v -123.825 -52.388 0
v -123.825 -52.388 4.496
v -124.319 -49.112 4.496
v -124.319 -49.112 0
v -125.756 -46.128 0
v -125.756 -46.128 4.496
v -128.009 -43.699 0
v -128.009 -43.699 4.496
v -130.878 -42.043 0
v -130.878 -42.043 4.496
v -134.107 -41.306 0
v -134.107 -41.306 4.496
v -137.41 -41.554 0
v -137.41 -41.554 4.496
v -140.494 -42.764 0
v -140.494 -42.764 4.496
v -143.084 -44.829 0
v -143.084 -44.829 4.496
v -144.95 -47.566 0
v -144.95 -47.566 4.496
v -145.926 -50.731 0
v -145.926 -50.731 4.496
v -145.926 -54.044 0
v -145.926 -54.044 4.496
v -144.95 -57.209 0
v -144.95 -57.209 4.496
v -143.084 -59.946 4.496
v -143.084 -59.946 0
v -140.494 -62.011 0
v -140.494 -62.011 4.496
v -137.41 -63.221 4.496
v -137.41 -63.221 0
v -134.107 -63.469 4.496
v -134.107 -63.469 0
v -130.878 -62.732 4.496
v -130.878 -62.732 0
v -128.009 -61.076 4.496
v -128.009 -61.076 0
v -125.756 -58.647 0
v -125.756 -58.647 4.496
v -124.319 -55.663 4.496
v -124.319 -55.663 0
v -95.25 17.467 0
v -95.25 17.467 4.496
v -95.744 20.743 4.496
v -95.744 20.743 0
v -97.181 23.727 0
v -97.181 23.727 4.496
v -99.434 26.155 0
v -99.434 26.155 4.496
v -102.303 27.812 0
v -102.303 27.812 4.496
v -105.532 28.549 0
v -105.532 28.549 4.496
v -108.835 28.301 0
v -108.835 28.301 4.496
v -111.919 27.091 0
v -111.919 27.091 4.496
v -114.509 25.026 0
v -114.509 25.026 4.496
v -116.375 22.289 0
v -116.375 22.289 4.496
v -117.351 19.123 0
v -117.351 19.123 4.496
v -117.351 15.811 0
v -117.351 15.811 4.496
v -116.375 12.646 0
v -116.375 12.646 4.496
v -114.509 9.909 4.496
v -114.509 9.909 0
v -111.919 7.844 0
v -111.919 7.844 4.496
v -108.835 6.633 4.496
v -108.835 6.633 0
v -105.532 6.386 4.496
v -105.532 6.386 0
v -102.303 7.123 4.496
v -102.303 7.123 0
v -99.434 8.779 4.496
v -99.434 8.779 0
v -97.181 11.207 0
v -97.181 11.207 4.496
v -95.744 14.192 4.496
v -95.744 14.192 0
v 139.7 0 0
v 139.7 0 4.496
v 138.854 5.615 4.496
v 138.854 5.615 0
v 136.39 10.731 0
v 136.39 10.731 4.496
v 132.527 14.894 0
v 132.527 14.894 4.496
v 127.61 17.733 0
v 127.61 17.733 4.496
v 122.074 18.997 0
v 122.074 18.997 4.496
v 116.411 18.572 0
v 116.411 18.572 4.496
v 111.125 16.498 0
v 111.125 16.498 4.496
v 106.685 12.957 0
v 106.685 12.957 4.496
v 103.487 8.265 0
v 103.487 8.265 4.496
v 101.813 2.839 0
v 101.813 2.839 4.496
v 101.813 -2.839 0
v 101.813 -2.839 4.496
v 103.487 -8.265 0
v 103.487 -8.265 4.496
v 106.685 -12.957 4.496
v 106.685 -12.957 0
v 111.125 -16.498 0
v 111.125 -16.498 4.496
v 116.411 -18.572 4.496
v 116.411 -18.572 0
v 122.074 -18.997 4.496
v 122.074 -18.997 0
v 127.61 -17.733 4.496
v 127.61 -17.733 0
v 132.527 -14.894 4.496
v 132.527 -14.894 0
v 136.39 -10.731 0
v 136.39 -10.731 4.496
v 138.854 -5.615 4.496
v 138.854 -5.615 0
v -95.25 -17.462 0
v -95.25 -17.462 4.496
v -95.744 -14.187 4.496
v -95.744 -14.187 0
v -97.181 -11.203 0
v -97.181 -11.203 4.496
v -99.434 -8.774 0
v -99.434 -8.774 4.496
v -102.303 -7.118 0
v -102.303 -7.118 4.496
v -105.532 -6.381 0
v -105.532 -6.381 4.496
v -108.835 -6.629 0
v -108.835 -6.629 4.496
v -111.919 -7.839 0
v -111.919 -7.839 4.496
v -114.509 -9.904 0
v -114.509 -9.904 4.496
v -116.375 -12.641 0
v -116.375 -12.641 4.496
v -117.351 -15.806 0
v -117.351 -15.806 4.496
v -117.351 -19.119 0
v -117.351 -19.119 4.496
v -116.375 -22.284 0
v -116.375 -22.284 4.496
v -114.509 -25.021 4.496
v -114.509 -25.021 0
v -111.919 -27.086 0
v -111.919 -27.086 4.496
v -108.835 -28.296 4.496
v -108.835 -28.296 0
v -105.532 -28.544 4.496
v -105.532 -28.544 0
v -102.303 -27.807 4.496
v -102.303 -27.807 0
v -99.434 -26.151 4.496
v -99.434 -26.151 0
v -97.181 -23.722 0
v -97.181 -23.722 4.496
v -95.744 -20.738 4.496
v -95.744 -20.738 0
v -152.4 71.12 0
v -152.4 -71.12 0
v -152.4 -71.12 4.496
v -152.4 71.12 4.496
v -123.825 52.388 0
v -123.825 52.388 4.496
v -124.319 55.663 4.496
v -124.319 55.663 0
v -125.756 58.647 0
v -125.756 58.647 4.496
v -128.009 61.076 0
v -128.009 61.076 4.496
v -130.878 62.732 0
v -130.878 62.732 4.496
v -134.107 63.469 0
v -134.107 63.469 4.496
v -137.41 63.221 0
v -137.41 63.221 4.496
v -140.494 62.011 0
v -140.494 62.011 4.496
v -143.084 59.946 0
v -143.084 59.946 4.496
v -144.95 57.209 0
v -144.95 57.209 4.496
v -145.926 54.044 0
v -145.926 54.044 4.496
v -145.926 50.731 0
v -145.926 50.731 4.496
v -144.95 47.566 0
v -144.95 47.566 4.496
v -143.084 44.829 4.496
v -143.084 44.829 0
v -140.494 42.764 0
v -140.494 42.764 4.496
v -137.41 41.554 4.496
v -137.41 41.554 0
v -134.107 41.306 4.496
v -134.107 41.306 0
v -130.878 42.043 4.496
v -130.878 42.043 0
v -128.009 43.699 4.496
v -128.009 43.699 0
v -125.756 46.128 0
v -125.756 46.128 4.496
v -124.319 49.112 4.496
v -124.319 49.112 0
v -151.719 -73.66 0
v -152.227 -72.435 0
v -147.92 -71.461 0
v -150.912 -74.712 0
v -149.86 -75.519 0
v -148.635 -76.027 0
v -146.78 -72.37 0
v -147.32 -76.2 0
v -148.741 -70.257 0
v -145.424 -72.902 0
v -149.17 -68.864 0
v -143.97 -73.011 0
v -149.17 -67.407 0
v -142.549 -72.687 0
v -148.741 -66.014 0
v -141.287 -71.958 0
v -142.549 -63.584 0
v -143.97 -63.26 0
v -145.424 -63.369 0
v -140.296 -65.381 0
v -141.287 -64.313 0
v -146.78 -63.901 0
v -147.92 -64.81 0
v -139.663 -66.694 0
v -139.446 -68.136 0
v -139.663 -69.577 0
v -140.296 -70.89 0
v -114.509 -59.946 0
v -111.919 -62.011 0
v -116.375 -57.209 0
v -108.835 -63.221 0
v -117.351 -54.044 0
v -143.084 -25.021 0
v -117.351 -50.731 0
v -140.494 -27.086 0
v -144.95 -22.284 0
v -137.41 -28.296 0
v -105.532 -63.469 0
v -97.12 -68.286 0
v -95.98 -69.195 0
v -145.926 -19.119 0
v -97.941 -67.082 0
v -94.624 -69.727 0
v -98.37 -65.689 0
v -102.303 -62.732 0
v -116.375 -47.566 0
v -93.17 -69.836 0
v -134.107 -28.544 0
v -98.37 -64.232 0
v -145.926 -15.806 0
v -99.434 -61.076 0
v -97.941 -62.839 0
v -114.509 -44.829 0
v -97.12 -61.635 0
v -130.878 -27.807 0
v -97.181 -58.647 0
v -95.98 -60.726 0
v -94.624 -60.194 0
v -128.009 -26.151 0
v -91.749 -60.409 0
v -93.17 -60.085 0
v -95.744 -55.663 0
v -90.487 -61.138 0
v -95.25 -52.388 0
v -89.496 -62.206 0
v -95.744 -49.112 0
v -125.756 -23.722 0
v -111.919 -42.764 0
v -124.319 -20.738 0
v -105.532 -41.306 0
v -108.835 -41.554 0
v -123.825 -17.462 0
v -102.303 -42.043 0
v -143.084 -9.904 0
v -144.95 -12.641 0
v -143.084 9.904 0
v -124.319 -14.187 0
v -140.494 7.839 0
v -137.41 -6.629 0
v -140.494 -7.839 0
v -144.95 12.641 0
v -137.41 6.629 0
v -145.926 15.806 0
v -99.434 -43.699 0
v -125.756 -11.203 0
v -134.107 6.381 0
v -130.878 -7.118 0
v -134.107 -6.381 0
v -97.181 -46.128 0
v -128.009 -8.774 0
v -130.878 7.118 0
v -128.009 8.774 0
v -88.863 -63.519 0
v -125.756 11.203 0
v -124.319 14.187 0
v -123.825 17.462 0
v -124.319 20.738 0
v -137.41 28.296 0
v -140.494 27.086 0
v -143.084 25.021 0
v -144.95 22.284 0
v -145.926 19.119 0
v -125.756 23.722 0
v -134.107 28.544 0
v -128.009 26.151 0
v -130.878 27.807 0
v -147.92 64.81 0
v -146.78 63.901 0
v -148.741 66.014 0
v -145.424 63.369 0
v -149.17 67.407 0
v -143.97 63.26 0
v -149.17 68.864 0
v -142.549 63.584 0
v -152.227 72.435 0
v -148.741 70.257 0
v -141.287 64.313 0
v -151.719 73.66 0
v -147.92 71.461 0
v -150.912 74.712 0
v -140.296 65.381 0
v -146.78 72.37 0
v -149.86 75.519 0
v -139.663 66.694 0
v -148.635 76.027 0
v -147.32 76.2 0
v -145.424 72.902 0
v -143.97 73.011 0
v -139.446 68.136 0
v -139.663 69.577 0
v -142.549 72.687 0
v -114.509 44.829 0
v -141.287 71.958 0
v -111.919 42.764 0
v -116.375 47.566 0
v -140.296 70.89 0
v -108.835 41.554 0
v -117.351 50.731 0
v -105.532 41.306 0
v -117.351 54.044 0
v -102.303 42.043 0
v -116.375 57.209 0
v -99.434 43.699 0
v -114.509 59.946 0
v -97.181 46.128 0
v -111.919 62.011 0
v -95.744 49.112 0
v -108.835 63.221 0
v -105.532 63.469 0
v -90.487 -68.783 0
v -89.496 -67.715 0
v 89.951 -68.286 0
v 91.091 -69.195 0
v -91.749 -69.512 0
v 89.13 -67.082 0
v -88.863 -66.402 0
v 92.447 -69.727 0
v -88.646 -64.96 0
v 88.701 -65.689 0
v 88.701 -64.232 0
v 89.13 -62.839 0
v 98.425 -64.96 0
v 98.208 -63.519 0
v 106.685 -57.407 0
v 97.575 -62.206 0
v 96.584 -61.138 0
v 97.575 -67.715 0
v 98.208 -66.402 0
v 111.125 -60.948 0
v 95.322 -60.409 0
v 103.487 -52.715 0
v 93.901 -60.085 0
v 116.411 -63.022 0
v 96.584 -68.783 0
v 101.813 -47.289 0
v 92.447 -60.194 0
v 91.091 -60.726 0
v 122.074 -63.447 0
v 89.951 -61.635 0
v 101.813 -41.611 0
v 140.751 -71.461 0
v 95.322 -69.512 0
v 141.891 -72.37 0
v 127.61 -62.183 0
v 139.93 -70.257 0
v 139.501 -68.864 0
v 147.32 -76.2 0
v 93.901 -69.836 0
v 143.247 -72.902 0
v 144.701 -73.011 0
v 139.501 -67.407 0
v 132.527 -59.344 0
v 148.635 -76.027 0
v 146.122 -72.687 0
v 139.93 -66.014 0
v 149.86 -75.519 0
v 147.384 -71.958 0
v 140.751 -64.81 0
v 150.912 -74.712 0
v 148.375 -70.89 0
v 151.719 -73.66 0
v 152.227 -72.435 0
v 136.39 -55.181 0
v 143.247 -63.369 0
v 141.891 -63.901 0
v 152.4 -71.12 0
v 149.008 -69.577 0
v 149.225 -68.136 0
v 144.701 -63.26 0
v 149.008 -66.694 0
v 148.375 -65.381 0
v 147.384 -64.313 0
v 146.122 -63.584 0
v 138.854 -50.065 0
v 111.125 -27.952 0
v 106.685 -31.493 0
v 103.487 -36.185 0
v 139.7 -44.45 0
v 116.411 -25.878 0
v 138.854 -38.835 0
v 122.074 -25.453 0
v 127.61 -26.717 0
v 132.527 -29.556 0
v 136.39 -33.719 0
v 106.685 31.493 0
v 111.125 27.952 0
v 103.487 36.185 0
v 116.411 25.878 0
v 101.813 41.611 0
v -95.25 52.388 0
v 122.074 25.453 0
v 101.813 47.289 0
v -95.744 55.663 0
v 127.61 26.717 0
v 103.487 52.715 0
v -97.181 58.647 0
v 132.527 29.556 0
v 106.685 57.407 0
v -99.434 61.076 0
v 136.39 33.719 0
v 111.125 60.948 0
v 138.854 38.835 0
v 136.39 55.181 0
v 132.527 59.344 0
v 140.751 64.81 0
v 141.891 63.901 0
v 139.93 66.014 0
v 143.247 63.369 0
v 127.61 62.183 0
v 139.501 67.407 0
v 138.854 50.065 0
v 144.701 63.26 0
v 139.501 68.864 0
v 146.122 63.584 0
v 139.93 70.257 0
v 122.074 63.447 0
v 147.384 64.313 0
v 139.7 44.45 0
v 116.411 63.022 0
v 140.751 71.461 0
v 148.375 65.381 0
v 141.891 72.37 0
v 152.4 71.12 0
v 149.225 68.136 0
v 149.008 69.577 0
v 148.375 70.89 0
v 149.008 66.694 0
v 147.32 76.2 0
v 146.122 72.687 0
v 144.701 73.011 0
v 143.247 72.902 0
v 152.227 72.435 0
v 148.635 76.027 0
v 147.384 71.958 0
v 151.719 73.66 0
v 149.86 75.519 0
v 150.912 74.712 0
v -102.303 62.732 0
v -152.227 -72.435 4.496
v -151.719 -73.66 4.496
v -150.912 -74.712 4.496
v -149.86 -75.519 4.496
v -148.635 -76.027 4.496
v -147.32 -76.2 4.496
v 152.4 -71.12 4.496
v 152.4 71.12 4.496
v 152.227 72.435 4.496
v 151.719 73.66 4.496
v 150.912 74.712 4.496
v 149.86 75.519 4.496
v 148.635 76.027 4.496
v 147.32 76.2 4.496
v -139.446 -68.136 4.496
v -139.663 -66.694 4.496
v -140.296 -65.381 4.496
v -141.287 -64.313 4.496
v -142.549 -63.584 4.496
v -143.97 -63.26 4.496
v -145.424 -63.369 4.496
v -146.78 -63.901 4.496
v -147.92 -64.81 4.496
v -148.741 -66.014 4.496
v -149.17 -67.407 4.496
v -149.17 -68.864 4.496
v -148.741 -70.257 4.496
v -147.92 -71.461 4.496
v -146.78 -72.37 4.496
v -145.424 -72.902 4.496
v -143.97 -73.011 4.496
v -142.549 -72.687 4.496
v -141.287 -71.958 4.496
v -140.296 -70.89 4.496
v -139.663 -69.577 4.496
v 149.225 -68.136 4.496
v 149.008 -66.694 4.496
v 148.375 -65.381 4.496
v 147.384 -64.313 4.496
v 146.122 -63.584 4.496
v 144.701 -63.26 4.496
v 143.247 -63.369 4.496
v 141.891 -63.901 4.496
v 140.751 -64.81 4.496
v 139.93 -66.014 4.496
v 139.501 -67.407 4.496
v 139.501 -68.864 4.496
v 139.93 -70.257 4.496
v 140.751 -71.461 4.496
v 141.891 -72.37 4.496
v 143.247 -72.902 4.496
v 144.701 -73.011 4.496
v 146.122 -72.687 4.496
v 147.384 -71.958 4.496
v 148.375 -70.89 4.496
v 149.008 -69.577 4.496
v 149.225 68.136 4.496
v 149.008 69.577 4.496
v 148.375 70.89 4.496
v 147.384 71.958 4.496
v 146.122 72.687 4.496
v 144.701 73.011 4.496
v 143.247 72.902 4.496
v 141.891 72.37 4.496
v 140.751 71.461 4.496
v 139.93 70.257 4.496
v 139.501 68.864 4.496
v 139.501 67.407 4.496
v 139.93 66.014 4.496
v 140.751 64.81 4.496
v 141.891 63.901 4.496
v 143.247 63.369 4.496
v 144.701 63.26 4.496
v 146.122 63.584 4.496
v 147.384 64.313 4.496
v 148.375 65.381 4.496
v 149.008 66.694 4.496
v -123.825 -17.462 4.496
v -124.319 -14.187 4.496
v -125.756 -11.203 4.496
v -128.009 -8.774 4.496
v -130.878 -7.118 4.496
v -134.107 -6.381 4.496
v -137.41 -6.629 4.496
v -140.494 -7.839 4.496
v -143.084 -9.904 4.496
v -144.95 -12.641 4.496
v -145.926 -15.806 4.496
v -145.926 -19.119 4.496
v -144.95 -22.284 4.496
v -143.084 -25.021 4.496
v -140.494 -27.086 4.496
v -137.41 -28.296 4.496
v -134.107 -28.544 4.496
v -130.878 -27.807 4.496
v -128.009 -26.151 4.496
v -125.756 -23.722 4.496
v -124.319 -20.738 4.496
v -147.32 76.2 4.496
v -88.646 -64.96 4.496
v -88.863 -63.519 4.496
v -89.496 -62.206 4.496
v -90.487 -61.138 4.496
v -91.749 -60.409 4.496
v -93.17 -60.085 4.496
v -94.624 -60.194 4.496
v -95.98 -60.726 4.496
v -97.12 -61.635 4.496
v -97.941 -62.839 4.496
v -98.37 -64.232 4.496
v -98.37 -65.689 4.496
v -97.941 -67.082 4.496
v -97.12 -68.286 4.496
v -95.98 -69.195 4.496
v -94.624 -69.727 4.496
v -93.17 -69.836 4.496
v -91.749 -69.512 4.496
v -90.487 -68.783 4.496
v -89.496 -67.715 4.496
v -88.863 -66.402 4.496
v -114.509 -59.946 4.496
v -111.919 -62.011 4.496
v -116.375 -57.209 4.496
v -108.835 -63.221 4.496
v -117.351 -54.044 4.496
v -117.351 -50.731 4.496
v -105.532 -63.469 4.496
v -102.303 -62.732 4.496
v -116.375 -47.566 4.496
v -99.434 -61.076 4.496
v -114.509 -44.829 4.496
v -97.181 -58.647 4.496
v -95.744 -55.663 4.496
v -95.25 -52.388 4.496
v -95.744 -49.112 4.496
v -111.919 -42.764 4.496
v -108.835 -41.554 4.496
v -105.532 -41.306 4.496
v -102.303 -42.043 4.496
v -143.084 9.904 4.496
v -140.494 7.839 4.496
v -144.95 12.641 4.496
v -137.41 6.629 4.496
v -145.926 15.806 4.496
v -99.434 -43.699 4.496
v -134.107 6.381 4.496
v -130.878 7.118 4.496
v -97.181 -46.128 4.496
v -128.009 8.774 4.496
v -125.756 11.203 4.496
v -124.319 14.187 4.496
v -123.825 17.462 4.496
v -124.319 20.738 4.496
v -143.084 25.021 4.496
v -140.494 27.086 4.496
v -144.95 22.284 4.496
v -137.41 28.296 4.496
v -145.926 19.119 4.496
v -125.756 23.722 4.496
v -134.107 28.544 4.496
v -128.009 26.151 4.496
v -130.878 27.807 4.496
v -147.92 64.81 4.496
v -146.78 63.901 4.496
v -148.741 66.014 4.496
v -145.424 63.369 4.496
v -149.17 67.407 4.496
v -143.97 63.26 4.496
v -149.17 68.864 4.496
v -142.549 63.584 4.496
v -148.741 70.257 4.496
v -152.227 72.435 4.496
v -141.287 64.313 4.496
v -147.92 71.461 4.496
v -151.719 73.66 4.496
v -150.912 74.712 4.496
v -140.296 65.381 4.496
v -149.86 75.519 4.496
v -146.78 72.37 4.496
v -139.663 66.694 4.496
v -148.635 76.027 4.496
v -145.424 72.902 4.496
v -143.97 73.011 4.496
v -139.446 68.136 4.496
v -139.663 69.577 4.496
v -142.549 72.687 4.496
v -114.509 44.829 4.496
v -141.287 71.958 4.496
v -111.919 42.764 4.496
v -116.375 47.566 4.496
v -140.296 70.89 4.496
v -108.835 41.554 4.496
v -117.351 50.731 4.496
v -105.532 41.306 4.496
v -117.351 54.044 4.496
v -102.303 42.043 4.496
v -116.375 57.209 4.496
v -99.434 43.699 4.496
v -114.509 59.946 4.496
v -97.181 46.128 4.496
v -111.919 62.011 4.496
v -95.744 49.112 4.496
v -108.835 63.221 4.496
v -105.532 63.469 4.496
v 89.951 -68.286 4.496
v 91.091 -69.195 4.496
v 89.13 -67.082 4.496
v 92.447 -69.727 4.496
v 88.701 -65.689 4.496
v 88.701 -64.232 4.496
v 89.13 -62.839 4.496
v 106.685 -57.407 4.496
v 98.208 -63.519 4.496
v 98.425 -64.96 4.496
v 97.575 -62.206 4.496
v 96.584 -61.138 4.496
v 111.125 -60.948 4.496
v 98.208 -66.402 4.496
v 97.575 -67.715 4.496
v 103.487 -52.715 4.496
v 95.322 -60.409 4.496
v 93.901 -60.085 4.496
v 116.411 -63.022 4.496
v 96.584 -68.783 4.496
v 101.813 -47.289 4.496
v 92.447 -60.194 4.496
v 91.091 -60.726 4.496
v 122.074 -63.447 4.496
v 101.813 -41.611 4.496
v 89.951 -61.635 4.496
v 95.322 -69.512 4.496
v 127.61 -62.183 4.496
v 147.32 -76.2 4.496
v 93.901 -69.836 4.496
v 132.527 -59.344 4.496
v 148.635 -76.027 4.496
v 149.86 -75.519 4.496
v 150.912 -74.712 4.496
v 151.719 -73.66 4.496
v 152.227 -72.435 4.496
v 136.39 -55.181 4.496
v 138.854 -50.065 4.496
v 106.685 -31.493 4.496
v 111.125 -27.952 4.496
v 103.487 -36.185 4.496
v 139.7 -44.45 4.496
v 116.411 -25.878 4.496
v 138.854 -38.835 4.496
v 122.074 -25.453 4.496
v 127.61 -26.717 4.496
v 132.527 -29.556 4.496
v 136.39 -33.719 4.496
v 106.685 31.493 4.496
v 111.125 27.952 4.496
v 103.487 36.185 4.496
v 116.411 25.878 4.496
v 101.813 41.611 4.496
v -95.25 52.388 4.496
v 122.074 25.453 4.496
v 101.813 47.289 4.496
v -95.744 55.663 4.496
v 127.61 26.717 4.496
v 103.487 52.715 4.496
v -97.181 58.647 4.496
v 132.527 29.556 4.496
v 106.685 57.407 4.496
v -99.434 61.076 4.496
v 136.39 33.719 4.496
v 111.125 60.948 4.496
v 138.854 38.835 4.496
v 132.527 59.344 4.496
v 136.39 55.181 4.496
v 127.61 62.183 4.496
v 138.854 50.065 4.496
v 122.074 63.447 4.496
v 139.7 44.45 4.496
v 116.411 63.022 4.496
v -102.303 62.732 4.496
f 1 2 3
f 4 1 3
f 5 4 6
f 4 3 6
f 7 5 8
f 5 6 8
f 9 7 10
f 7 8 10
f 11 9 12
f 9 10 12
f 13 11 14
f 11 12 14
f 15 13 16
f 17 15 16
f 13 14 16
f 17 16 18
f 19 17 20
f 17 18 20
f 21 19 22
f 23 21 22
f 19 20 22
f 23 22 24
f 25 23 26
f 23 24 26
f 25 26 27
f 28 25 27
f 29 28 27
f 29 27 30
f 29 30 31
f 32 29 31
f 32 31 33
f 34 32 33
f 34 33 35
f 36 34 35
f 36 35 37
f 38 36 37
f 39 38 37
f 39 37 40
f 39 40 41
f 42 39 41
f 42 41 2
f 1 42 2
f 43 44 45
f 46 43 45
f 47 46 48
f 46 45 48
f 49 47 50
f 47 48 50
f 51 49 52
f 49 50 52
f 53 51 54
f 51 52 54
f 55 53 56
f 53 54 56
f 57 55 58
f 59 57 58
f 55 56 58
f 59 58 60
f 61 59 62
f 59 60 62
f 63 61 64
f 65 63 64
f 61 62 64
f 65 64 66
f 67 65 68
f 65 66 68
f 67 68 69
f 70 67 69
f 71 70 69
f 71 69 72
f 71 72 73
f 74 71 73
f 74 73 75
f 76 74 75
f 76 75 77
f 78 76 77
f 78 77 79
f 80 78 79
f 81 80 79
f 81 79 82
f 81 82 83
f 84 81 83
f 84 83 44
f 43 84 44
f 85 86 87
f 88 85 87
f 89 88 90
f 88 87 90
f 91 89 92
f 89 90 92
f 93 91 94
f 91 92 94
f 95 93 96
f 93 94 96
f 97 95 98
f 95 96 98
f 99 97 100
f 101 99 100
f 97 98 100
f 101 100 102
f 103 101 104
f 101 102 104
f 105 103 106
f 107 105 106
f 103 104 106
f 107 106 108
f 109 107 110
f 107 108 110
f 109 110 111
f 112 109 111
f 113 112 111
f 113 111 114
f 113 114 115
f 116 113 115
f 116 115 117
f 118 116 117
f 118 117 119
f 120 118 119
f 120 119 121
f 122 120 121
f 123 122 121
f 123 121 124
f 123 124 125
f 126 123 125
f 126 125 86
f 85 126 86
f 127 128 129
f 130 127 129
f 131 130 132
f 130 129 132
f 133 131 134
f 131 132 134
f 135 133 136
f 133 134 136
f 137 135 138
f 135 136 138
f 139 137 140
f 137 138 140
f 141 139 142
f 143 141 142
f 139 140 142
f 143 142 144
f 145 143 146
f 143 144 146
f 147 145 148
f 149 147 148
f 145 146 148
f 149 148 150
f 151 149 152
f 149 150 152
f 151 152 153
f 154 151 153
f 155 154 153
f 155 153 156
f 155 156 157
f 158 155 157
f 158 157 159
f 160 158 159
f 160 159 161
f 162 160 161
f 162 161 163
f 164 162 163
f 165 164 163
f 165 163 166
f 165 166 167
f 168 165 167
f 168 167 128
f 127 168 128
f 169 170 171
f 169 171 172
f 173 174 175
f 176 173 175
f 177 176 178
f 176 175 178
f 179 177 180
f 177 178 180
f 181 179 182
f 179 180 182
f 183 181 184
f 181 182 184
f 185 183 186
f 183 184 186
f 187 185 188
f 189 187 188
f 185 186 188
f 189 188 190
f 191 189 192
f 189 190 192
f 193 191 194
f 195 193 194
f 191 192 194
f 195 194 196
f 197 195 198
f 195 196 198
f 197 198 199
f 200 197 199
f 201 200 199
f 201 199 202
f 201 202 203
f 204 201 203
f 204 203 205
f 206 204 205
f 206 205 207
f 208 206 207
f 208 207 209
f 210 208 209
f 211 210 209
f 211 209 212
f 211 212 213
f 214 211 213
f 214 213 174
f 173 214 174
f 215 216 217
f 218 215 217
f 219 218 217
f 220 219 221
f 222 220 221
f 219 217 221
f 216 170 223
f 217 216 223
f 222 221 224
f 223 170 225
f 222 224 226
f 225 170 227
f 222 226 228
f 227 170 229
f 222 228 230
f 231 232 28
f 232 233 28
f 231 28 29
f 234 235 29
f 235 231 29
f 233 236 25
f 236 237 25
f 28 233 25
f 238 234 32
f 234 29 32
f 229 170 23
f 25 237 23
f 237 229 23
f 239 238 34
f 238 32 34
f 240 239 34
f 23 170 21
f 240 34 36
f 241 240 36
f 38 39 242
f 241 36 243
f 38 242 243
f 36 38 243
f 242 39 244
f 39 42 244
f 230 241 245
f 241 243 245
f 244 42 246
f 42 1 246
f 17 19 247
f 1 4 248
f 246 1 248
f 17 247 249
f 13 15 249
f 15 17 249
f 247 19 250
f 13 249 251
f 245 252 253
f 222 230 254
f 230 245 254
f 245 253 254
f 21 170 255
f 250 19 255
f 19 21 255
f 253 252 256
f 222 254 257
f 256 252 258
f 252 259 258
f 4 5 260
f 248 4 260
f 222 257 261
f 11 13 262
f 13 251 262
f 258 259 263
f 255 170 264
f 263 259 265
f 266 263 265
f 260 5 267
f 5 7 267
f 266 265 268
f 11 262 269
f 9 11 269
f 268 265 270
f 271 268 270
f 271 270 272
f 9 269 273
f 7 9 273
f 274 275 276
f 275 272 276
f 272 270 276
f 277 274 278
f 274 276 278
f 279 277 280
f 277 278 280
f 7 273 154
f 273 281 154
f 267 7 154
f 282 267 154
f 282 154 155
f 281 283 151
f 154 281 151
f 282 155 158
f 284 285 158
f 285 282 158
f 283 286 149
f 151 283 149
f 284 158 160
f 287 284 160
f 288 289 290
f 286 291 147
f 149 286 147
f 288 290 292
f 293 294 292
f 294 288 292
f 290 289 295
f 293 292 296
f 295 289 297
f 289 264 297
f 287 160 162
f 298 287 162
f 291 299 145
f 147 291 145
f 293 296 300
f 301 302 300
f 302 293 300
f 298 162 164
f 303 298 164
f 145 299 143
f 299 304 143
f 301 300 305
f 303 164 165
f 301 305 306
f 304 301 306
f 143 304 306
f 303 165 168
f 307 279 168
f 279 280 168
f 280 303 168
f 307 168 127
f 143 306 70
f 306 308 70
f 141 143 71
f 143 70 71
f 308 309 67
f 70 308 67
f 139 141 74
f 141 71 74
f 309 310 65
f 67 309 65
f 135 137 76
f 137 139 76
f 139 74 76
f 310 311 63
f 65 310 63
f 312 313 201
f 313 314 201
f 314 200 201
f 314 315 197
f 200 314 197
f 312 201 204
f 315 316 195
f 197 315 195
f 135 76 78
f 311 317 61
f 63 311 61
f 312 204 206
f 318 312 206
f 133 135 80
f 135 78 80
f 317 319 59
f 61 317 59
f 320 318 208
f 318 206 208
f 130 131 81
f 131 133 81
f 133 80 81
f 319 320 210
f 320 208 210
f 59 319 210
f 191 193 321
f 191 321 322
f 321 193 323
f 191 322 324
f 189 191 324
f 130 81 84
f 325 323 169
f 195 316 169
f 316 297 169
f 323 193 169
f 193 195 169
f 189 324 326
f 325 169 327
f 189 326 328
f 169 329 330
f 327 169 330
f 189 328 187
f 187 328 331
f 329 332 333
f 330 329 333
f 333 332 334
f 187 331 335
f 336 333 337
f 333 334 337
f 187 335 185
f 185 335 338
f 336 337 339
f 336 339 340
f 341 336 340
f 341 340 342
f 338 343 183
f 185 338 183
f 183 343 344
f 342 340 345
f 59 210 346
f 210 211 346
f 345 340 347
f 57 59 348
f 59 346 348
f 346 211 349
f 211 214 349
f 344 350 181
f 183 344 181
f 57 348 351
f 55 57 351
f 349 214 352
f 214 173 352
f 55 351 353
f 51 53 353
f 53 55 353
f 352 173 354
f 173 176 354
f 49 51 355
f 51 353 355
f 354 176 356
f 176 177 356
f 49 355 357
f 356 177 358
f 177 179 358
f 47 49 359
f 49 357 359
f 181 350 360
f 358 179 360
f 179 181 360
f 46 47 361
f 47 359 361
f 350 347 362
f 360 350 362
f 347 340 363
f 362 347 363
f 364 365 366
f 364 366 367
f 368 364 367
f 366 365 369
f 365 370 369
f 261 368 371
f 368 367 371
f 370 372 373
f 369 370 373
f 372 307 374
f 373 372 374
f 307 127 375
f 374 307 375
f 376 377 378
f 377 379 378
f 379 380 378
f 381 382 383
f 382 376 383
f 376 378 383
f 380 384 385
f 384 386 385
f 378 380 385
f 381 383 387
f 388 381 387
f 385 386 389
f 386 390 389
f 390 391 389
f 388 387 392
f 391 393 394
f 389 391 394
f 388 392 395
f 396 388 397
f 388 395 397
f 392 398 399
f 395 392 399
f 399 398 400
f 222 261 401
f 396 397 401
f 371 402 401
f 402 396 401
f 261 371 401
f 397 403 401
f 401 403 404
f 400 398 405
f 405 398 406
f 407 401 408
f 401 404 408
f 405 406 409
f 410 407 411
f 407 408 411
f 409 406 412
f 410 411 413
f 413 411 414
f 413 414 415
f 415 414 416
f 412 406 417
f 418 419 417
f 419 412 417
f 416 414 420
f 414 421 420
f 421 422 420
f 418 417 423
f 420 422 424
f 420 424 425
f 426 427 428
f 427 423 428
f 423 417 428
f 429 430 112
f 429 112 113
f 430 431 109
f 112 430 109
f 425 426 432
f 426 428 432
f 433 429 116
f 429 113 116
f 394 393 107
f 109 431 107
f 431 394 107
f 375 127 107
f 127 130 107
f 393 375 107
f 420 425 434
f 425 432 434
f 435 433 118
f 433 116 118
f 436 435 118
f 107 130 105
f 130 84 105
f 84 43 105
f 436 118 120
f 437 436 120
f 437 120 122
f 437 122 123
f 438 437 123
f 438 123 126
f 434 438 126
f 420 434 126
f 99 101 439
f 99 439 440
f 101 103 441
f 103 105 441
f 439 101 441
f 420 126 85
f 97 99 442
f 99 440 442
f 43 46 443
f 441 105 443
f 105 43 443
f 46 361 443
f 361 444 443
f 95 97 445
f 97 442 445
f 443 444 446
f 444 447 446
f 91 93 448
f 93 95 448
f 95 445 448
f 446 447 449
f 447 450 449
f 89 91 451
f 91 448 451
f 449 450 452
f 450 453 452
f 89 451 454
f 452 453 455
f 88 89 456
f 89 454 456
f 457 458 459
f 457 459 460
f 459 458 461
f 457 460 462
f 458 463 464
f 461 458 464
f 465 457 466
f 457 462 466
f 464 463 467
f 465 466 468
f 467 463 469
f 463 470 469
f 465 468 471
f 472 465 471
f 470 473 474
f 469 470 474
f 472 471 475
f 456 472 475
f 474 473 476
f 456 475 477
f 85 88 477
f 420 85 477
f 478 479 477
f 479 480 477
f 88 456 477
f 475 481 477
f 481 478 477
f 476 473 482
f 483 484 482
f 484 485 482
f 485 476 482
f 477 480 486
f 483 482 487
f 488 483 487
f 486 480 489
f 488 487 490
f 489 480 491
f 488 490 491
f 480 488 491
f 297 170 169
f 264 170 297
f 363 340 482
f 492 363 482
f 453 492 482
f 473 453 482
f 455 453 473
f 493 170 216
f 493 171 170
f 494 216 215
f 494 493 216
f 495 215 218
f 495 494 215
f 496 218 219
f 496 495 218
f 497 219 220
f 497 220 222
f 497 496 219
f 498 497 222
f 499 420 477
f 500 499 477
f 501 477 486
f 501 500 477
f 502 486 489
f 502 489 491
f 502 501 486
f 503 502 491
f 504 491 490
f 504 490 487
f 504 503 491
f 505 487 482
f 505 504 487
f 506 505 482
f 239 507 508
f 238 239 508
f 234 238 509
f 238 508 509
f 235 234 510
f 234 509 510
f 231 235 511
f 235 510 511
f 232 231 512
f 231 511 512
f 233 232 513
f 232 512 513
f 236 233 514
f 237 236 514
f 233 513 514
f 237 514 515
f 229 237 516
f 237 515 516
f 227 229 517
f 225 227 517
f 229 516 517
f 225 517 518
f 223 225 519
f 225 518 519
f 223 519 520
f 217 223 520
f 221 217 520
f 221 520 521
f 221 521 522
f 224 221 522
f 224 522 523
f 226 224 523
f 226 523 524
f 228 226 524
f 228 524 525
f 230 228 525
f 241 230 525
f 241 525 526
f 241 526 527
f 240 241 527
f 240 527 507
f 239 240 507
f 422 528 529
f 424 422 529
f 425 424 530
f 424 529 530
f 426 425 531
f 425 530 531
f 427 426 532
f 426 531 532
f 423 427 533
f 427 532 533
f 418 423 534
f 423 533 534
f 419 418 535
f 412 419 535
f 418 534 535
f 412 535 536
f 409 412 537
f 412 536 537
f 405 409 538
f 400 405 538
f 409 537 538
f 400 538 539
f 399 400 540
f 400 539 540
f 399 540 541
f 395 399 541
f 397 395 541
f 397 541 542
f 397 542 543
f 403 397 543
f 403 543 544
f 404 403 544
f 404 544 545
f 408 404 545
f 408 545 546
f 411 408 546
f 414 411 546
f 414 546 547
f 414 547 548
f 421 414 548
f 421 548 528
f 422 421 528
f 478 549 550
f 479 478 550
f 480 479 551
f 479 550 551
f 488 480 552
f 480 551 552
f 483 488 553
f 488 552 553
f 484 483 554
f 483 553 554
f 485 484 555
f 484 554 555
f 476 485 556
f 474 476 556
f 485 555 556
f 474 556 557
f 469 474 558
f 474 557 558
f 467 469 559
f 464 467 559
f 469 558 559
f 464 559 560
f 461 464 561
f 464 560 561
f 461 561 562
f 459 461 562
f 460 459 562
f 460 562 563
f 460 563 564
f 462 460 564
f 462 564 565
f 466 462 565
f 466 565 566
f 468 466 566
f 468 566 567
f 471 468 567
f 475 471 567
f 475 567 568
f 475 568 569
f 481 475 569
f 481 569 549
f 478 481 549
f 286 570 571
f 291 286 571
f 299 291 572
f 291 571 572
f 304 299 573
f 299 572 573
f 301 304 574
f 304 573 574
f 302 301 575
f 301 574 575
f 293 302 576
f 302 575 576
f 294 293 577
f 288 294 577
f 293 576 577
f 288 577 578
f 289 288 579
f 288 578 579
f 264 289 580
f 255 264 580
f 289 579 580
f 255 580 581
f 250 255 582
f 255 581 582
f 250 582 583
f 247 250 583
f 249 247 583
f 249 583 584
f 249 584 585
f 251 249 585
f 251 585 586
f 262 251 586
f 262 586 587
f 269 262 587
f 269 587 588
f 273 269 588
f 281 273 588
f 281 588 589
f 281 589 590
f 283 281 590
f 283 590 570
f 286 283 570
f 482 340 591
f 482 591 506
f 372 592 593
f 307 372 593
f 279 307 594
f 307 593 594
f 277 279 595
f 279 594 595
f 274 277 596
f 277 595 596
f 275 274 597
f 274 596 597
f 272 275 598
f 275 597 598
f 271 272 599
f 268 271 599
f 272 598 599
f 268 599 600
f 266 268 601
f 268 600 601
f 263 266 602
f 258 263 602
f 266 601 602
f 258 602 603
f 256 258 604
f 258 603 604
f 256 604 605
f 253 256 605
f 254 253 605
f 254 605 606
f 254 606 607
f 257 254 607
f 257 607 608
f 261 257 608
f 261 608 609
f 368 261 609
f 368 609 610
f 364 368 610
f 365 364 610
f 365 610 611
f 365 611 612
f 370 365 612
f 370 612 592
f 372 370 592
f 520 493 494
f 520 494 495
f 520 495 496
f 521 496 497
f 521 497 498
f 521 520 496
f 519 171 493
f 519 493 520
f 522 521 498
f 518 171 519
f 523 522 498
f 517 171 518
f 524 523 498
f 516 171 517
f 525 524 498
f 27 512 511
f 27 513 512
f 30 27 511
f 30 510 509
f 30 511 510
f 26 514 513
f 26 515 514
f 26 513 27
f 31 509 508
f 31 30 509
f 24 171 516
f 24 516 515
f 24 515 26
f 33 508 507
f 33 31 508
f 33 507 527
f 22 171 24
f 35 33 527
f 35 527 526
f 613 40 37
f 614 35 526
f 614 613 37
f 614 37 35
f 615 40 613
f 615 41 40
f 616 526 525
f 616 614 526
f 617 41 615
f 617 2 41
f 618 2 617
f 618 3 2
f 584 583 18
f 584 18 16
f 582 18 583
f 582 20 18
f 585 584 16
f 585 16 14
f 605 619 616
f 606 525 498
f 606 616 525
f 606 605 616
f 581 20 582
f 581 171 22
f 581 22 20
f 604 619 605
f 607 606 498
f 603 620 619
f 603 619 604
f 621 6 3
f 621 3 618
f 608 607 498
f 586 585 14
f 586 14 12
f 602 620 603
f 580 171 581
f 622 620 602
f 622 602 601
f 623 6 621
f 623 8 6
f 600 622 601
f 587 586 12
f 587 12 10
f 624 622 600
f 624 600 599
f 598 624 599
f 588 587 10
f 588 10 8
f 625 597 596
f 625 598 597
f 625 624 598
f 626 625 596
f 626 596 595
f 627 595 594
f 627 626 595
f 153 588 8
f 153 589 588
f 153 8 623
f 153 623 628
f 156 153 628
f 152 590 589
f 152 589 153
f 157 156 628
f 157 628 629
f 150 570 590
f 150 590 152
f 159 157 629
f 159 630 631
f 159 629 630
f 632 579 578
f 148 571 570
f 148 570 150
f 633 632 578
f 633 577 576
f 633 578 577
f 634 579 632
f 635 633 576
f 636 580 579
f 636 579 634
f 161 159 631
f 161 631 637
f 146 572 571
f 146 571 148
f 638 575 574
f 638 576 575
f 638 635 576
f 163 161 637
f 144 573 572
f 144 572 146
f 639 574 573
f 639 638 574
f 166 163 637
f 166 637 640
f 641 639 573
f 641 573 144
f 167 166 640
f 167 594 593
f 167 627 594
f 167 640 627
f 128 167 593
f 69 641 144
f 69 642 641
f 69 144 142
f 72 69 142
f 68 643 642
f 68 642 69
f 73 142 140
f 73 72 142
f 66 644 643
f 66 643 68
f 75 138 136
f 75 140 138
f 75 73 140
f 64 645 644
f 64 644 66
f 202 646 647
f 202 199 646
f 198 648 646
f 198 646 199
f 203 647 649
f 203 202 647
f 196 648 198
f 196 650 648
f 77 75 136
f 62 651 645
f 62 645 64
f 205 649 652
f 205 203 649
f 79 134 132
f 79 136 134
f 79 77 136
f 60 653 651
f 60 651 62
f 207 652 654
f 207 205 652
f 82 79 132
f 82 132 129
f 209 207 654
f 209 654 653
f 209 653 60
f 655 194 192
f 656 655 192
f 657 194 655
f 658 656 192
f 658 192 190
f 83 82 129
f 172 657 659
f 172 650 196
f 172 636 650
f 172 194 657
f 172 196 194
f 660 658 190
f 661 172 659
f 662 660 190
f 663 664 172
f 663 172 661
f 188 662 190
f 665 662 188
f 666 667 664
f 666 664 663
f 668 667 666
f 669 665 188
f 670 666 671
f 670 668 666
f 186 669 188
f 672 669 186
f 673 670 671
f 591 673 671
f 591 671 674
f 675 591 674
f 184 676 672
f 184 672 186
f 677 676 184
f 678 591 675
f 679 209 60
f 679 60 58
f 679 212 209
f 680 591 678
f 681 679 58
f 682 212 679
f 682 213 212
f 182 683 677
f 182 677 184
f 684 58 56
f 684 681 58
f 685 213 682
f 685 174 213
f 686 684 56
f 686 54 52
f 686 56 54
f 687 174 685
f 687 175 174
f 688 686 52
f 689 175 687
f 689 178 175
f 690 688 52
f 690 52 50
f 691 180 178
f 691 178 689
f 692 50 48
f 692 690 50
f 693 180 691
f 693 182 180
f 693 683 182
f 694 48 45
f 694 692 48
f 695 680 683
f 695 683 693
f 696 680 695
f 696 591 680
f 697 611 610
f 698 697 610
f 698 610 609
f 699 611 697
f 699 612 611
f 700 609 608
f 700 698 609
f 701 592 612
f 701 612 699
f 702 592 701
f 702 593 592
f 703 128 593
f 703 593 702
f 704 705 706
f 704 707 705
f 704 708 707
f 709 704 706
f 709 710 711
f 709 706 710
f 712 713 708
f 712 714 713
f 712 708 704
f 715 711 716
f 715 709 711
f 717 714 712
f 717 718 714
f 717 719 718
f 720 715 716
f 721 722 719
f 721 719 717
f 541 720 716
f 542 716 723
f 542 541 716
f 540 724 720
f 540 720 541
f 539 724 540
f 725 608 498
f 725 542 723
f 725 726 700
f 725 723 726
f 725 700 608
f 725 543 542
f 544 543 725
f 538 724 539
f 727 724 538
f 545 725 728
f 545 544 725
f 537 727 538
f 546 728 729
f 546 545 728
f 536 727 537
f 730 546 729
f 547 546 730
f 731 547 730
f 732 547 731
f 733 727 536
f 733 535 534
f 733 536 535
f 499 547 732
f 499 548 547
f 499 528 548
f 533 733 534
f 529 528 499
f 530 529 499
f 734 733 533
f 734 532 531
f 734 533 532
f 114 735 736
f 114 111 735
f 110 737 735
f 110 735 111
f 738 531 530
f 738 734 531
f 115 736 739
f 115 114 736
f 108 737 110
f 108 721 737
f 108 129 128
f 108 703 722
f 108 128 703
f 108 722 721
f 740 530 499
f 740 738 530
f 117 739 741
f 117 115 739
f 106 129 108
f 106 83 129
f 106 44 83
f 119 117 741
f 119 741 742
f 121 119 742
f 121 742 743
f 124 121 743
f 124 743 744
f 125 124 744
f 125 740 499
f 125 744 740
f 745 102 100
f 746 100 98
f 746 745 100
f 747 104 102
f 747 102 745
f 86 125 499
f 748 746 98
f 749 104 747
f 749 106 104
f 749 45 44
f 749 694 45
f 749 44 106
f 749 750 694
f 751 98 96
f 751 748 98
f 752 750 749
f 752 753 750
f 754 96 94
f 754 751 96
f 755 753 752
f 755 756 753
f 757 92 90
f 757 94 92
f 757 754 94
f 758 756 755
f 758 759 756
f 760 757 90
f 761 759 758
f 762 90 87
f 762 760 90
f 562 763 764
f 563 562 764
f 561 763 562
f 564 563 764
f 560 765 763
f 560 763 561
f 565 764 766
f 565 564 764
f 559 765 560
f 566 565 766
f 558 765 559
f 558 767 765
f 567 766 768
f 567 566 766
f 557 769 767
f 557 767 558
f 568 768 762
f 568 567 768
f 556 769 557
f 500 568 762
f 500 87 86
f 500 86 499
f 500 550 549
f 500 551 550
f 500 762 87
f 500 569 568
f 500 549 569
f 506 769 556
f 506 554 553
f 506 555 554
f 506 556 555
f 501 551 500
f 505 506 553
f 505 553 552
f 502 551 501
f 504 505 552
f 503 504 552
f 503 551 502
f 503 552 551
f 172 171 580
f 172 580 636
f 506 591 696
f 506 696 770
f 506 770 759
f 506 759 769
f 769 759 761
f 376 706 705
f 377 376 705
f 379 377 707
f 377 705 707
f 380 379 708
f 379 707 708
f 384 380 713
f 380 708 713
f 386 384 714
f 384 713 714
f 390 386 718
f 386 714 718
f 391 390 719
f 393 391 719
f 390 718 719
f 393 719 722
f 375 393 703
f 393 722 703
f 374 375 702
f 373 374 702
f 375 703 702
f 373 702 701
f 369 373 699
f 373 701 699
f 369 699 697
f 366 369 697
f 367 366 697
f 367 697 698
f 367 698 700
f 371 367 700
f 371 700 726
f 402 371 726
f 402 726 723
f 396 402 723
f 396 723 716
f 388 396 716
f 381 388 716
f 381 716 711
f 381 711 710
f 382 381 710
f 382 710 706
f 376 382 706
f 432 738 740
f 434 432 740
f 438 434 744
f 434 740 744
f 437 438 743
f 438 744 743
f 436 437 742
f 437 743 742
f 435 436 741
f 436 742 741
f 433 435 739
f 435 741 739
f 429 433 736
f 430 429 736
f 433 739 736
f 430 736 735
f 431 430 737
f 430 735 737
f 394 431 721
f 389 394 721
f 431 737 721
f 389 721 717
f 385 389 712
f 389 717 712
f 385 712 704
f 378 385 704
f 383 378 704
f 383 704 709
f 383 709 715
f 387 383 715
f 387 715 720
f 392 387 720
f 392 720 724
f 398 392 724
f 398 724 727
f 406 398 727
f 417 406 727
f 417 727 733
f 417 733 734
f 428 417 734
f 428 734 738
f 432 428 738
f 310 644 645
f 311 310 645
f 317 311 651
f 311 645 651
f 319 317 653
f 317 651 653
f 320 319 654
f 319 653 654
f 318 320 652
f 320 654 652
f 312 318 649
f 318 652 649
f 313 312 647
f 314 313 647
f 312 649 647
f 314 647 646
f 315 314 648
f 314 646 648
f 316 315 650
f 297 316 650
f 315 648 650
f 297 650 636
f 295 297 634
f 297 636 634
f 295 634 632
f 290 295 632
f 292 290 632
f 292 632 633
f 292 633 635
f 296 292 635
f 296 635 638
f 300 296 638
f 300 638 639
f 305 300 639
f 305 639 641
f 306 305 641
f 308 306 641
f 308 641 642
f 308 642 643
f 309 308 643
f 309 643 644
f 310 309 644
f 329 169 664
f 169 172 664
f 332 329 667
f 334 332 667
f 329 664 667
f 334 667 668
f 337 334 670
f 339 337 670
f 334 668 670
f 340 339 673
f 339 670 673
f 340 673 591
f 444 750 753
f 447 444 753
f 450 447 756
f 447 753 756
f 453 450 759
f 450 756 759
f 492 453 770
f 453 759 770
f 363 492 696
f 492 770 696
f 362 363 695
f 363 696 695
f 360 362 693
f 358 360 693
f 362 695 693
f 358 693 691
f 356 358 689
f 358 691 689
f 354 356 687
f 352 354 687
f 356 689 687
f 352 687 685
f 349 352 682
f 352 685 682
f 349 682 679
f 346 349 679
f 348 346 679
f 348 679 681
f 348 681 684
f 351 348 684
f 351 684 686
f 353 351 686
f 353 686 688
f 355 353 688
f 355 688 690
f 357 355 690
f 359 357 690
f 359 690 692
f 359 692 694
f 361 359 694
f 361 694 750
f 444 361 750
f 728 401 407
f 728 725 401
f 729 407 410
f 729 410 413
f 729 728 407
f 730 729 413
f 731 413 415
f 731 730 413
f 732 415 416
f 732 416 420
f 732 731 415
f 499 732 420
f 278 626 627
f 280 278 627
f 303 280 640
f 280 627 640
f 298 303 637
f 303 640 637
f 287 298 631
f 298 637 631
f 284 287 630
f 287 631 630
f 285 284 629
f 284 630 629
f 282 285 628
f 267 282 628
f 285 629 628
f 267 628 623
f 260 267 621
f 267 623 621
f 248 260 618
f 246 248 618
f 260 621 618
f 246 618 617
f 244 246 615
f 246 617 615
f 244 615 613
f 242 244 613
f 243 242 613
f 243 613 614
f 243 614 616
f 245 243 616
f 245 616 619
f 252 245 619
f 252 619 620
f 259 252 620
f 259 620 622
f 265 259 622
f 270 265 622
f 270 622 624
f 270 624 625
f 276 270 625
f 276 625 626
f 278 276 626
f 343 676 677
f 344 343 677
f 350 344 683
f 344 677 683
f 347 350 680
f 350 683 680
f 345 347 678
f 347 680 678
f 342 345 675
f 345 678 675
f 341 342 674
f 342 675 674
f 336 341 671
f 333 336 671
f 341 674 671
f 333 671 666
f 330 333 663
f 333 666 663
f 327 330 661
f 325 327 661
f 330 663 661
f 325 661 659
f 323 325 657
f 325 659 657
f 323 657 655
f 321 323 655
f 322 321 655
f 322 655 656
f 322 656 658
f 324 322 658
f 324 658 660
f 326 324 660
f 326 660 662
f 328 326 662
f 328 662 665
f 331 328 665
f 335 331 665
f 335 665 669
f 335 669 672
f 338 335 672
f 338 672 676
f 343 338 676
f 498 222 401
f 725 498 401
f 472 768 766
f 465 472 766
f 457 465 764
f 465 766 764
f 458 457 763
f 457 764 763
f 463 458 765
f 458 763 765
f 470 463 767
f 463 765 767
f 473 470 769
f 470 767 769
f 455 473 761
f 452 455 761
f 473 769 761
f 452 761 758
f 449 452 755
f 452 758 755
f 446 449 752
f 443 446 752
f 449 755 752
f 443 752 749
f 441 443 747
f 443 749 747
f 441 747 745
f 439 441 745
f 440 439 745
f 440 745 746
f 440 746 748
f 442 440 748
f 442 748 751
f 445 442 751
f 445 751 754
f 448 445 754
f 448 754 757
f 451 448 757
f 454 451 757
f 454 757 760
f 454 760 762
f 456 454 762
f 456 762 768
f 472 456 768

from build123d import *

# Parameters (mm, degrees)
F0_W      = 304.8
F0_H      = 152.4
F1_DEPTH  = 4.4958
F2_R      = 5.08
F3_R      = 4.8895
F4_DEPTH  = 4.4968
F5_R      = 11.1125
F6_DEPTH  = 4.4968
F7_R      = 19.05
F8_DEPTH  = 4.4968
F9_R      = 4.8895
F10_DEPTH = 4.4968


with BuildPart() as f1:
    # F0 (on Top) → F1 (new body)
    with BuildSketch(Plane.XY):
        Rectangle(F0_W, F0_H)
    extrude(amount=F1_DEPTH)

    # F2
    f2_edges = [f1.edges().sort_by_distance(p)[0] for p in [
        (-152.4, 76.2, 2.2479),
        (-152.4, -76.2, 2.2479),
        (152.4, -76.2, 2.2479),
        (152.4, 76.2, 2.2479),
    ]]
    fillet(f2_edges, radius=F2_R)

    # F3 (on face) → F4 (cut, through all)
    with BuildSketch(Plane.XY.offset(4.4958)):
        with Locations((-144.3355, 68.1355)):
            Circle(F3_R)
        with Locations((-144.3355, -68.1355)):
            Circle(F3_R)
        with Locations((144.3355, -68.1355)):
            Circle(F3_R)
        with Locations((144.3355, 68.1355)):
            Circle(F3_R)
    extrude(amount=-F4_DEPTH, mode=Mode.SUBTRACT)

    # F5 (on face) → F6 (cut, through all)
    with BuildSketch(Plane.XY.offset(4.4958)):
        with Locations((-106.3625, 52.3875)):
            Circle(F5_R)
        with Locations((-134.9375, 52.3875)):
            Circle(F5_R)
        with Locations((-134.9375, 17.4625)):
            Circle(F5_R)
        with Locations((-106.3625, 17.467218)):
            Circle(F5_R)
        with Locations((-134.9375, -17.4625)):
            Circle(F5_R)
        with Locations((-106.3625, -17.4625)):
            Circle(F5_R)
        with Locations((-134.9375, -52.3875)):
            Circle(F5_R)
        with Locations((-106.3625, -52.3875)):
            Circle(F5_R)
    extrude(amount=-F6_DEPTH, mode=Mode.SUBTRACT)

    # F7 (on face) → F8 (cut, through all)
    with BuildSketch(Plane.XY.offset(4.4958)):
        with Locations((120.65, 44.45)):
            Circle(F7_R)
        with Locations((120.65, 0)):
            Circle(F7_R)
        with Locations((120.65, -44.45)):
            Circle(F7_R)
    extrude(amount=-F8_DEPTH, mode=Mode.SUBTRACT)

    # F9 (on face) → F10 (cut, through all)
    with BuildSketch(Plane.XY.offset(4.4958)):
        with Locations((-93.5355, -64.9605)):
            Circle(F9_R)
        with Locations((93.5355, -64.9605)):
            Circle(F9_R)
    extrude(amount=-F10_DEPTH, mode=Mode.SUBTRACT)


solid = f1.part
